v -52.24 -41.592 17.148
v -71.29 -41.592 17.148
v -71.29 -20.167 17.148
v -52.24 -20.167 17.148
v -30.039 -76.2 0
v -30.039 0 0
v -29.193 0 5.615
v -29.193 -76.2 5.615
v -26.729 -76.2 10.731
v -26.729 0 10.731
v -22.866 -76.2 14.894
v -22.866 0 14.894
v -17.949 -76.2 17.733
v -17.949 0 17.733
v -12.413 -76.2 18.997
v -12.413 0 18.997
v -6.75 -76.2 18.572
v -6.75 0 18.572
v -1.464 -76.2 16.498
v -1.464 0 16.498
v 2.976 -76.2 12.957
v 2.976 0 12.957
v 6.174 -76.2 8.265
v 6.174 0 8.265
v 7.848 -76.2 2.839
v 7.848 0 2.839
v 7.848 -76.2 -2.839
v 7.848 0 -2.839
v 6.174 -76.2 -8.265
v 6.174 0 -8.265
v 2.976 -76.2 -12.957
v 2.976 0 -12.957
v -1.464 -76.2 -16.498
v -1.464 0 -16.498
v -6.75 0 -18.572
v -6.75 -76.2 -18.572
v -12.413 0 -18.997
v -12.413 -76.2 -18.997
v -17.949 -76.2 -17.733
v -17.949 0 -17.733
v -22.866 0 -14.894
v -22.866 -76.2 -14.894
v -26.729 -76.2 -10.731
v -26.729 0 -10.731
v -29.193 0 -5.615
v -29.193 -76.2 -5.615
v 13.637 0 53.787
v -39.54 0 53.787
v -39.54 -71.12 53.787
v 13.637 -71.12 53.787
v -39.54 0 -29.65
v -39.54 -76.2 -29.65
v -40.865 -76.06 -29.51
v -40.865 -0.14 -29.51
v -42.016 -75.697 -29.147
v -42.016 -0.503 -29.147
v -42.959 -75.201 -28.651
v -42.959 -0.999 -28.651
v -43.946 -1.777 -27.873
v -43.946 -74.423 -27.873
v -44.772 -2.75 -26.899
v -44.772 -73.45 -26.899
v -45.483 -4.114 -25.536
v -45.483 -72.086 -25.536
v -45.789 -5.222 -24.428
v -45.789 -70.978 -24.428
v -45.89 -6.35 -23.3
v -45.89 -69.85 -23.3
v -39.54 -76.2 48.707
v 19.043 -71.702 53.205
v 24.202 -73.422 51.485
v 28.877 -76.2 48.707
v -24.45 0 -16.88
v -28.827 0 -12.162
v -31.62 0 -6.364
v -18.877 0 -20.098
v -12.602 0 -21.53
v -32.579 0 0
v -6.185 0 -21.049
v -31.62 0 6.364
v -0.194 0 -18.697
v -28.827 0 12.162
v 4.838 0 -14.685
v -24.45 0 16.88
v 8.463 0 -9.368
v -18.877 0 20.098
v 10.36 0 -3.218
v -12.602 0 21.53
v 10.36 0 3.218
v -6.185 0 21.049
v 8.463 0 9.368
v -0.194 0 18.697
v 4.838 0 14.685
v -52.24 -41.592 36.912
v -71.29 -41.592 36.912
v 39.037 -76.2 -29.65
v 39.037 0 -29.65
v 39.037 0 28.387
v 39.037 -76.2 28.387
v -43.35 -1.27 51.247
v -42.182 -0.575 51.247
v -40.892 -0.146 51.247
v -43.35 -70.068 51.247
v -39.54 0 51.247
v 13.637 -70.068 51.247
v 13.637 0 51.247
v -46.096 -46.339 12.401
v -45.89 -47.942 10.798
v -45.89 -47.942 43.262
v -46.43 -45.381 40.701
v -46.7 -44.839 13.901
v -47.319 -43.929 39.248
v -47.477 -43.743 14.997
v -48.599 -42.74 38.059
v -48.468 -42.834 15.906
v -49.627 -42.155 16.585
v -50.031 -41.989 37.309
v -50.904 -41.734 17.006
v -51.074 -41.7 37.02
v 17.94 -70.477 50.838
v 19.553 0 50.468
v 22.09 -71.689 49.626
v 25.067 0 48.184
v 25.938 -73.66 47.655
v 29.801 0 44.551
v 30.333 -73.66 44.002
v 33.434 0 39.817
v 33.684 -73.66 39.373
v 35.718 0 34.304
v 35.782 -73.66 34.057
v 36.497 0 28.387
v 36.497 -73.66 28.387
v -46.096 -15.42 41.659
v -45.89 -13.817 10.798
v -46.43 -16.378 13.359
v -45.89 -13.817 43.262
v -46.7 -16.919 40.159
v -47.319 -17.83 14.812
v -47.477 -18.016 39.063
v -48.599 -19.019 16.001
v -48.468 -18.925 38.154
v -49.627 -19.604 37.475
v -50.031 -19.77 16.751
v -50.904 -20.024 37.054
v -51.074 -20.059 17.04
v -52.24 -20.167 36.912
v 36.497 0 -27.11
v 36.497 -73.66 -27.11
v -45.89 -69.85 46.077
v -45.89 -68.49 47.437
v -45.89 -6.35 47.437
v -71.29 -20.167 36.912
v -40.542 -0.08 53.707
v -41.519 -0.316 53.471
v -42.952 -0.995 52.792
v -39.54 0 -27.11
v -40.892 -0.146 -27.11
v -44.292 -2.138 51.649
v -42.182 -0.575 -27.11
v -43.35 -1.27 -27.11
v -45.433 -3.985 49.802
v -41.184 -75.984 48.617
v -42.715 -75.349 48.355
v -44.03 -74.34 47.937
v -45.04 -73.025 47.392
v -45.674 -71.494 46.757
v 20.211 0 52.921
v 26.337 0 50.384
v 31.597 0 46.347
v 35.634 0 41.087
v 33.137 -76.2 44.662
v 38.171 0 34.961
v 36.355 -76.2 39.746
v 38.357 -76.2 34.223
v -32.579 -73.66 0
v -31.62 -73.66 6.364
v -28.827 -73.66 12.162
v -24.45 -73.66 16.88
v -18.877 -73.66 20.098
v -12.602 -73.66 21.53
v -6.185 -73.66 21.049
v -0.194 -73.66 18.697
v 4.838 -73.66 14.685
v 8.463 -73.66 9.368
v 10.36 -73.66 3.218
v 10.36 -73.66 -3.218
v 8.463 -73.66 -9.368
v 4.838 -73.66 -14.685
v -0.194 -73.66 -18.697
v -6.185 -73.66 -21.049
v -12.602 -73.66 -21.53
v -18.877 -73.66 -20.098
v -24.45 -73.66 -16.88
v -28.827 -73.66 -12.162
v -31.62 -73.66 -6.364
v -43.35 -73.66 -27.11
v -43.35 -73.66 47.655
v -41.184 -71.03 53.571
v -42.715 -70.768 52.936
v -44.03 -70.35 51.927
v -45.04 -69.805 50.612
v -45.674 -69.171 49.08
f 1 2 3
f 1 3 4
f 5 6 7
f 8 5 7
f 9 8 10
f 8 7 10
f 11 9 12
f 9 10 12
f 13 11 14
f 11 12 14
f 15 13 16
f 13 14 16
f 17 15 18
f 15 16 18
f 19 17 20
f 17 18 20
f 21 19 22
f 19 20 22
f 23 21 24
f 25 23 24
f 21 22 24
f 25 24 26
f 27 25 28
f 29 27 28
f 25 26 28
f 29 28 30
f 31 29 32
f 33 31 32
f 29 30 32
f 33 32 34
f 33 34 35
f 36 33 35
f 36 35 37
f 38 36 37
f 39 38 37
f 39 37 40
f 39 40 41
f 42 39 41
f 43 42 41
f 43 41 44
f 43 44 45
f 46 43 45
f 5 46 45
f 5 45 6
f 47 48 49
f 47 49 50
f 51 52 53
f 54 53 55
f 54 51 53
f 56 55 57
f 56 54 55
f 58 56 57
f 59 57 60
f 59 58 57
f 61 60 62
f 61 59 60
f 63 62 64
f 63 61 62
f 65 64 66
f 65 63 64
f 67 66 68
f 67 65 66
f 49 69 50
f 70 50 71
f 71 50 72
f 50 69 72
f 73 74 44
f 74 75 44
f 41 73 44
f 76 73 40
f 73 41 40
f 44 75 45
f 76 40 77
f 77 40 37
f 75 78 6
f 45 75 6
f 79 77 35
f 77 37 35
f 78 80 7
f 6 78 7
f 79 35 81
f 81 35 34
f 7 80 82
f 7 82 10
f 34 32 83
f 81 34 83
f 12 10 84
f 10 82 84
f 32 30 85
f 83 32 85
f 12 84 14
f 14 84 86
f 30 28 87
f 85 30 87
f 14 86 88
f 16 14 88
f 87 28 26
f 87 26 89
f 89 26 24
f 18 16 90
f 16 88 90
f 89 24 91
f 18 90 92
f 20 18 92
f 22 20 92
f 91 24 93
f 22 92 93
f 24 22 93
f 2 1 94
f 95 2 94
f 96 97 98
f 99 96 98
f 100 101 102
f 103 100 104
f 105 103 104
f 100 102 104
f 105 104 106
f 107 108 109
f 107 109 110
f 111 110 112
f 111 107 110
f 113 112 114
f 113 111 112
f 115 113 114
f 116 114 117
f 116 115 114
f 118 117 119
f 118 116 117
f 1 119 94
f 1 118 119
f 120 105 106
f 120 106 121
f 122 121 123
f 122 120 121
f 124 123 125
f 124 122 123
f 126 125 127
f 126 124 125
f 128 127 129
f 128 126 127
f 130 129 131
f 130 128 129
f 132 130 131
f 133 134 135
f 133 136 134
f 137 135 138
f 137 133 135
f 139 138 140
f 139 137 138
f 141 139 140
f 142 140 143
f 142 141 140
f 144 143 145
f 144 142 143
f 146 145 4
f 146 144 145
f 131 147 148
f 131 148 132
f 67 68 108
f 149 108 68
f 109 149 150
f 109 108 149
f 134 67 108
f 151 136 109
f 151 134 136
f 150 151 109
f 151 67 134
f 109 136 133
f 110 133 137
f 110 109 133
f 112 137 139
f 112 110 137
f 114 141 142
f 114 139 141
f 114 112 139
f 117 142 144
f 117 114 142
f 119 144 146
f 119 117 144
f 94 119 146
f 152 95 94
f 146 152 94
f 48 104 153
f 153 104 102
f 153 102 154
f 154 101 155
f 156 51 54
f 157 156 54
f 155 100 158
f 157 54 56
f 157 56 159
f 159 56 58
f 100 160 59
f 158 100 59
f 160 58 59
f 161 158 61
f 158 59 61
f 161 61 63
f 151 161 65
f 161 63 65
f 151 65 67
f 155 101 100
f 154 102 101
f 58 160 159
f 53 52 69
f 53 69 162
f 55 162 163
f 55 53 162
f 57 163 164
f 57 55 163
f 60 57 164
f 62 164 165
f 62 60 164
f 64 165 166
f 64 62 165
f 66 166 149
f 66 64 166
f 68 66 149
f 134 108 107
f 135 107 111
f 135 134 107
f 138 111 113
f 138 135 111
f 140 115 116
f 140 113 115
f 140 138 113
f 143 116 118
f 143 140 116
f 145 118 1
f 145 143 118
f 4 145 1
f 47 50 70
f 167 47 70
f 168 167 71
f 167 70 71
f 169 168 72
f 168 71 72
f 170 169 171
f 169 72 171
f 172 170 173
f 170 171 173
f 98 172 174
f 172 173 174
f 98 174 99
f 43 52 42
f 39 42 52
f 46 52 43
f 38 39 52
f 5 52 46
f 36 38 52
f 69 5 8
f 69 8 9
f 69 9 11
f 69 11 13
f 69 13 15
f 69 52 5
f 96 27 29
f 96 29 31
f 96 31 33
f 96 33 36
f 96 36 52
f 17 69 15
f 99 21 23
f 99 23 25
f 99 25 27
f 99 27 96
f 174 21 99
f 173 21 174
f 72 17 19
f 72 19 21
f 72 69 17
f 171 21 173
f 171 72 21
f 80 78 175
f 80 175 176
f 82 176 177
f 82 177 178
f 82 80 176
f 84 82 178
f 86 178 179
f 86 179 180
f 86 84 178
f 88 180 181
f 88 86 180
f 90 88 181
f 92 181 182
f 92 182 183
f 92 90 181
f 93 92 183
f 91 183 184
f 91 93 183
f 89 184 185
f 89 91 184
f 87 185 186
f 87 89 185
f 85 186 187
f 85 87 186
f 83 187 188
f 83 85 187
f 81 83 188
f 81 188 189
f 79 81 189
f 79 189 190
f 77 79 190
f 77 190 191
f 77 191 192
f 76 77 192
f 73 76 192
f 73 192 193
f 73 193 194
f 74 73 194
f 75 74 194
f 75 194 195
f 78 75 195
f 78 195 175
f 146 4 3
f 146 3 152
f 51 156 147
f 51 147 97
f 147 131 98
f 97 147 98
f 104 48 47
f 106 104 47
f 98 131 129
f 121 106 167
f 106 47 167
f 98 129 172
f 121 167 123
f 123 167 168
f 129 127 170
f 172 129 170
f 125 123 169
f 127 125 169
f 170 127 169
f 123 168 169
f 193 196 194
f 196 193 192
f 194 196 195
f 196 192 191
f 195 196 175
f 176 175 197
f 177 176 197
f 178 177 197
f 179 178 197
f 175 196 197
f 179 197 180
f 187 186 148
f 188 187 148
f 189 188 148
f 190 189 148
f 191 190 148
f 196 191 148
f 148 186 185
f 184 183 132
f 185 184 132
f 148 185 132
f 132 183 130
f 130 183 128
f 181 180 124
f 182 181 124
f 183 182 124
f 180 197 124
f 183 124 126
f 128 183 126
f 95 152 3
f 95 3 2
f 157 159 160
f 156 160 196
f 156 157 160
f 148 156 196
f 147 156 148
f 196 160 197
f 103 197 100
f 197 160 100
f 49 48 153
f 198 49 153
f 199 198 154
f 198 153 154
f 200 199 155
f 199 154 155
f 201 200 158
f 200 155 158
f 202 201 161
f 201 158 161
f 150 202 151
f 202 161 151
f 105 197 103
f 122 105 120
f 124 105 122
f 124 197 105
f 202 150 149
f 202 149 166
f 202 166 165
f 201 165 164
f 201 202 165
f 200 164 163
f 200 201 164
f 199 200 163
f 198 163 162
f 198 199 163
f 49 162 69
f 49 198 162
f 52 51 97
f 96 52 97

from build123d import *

# Parameters (mm, degrees)
F0_W          = 84.9268175662
F0_H          = 83.4368709475
F1_DEPTH      = 76.2
F2_SIZE       = 5.08
F3_R          = 25.4
F5_D          = 38.1
F8_T          = -2.54
F9_W          = 21.4254707098
F9_H          = 19.7638887912
F10_DEPTH     = 25.4
F11_T1_DEPTH  = 19.7638887912
F11_T3_DEPTH  = 21.4254707098
F11_T9_DEPTH  = 35.6388887912
F11_T13_DEPTH = 37.3004707098
F11_T20_DEPTH = 35.6388887912
F11_T24_DEPTH = 37.3004707098
F11_T31_DEPTH = 37.3004707098
F11_T35_DEPTH = 35.6388887912
F11_T42_DEPTH = 35.6388887912
F11_T46_DEPTH = 37.3004707098
F11_T49_DEPTH = 102.87
F11_T51_DEPTH = 38.9342048969
F11_T53_DEPTH = 115.1868709475
F11_T55_DEPTH = 110.1068709475
F11_T57_DEPTH = 107.95


# Not quite as in the source:
# - a fillet or chamfer that OpenCascade refuses, or shapes differently, is made with other operations: its cross-section is extruded or revolved along the edge and cut away or added


with BuildPart() as f1:
    # F0 (on Front) → F1 (new body)
    with BuildSketch(Plane.XZ):
        with Locations((-3.4268703312, 12.0685463771)):
            Rectangle(F0_W, F0_H)
    extrude(amount=F1_DEPTH)

    # F2
    f2_edges = [f1.edges().sort_by_distance(p)[0] for p in [
        (-3.42687, -76.2, 53.786982),
    ]]
    chamfer(f2_edges, length=F2_SIZE)

    # F3
    f3_edges = [f1.edges().sort_by_distance(p)[0] for p in [
        (39.036538, -35.56, 53.786982),
    ]]
    fillet(f3_edges, radius=F3_R)

    # F5 (through all)
    with Locations(Plane.XZ.offset(76.2)):
        with Locations((-10.9889917076, 0)):
            Hole(F5_D / 2)

    # F8
    f8_openings = [f1.faces().sort_by_distance(p)[0] for p in [
        (-16.12687, 0, 52.596424),
    ]]
    offset(amount=F8_T, openings=f8_openings)

    # F9 (on face) → F10 (join)
    with BuildSketch(Plane(origin=(-45.8902791142, 0, 0), x_dir=(0, -1, 0), z_dir=(-1, 0, 0))):
        with Locations((30.8794565499, 27.0300125703)):
            Rectangle(F9_W, F9_H)
    extrude(amount=F10_DEPTH)

    # F11: fillet of radius 6.35 on 9 edges, made by hand

    # F11_s2 → F11_t1 (join)
    with BuildSketch(Plane.XY.offset(17.1480681747)):
        with BuildLine():
            ThreePointArc((-45.8902791142, -13.816721195), (-47.7501510537, -18.3068492555), (-52.2402791142, -20.166721195))
            Line((-52.2402791142, -20.166721195), (-45.8902791142, -20.166721195))
            Line((-45.8902791142, -20.166721195), (-45.8902791142, -13.816721195))
        make_face()
        with BuildLine():
            ThreePointArc((-45.8902791142, -47.9421919048), (-47.7501510537, -43.4520638442), (-52.2402791142, -41.5921919048))
            Line((-52.2402791142, -41.5921919048), (-45.8902791142, -41.5921919048))
            Line((-45.8902791142, -41.5921919048), (-45.8902791142, -47.9421919048))
        make_face()
    extrude(amount=F11_T1_DEPTH)

    # F11_s4 → F11_t3 (join)
    with BuildSketch(Plane.XZ.offset(20.166721195)):
        with BuildLine():
            ThreePointArc((-45.8902791142, 43.2619569659), (-47.7501510537, 38.7718289054), (-52.2402791142, 36.9119569659))
            Line((-52.2402791142, 36.9119569659), (-45.8902791142, 36.9119569659))
            Line((-45.8902791142, 36.9119569659), (-45.8902791142, 43.2619569659))
        make_face()
        with BuildLine():
            ThreePointArc((-45.8902791142, 10.7980681747), (-47.7501510537, 15.2881962353), (-52.2402791142, 17.1480681747))
            Line((-52.2402791142, 17.1480681747), (-45.8902791142, 17.1480681747))
            Line((-45.8902791142, 17.1480681747), (-45.8902791142, 10.7980681747))
        make_face()
    extrude(amount=F11_T3_DEPTH)


with BuildPart() as f11_tool7:
    # F11_s8 → F11_t9 (new body)
    with BuildSketch(Plane.XY.offset(52.7869569659)):
        with BuildLine():
            ThreePointArc((-45.8902791142, -13.816721195), (-47.7501510537, -18.3068492555), (-52.2402791142, -20.166721195))
            Line((-52.2402791142, -20.166721195), (-45.8902791142, -20.166721195))
            Line((-45.8902791142, -20.166721195), (-45.8902791142, -13.816721195))
        make_face()
    extrude(amount=-F11_T9_DEPTH)

    split(bisect_by=Plane.XY.offset(36.9119569659), keep=Keep.TOP)


with BuildPart() as f11_tool11:
    # F11_s12 → F11_t13 (new body)
    with BuildSketch(Plane.XZ.offset(41.5921919048)):
        with BuildLine():
            ThreePointArc((-45.8902791142, 43.2619569659), (-47.7501510537, 38.7718289054), (-52.2402791142, 36.9119569659))
            Line((-52.2402791142, 36.9119569659), (-45.8902791142, 36.9119569659))
            Line((-45.8902791142, 36.9119569659), (-45.8902791142, 43.2619569659))
        make_face()
    extrude(amount=-F11_T13_DEPTH)

    split(bisect_by=Plane.XZ.offset(20.166721195), keep=Keep.BOTTOM)


with BuildPart() as f11_tool7_1:
    add(f11_tool7.part)

    # F11_t15: intersect F11_tool11
    add(f11_tool11.part, mode=Mode.INTERSECT)


with BuildPart() as f1_1:
    add(f1.part)

    # F11_t5: union F11_tool7
    add(f11_tool7_1.part)


with BuildPart() as f11_tool18:
    # F11_s19 → F11_t20 (new body)
    with BuildSketch(Plane.XY.offset(36.9119569659)):
        with BuildLine():
            ThreePointArc((-45.8902791142, -13.816721195), (-47.7501510537, -18.3068492555), (-52.2402791142, -20.166721195))
            Line((-52.2402791142, -20.166721195), (-45.8902791142, -20.166721195))
            Line((-45.8902791142, -20.166721195), (-45.8902791142, -13.816721195))
        make_face()
    extrude(amount=-F11_T20_DEPTH)

    split(bisect_by=Plane.XY.offset(17.1480681747), keep=Keep.BOTTOM)


with BuildPart() as f11_tool22:
    # F11_s23 → F11_t24 (new body)
    with BuildSketch(Plane.XZ.offset(4.291721195)):
        with BuildLine():
            ThreePointArc((-45.8902791142, 10.7980681747), (-47.7501510537, 15.2881962353), (-52.2402791142, 17.1480681747))
            Line((-52.2402791142, 17.1480681747), (-45.8902791142, 17.1480681747))
            Line((-45.8902791142, 17.1480681747), (-45.8902791142, 10.7980681747))
        make_face()
    extrude(amount=F11_T24_DEPTH)

    split(bisect_by=Plane.XZ.offset(20.166721195), keep=Keep.BOTTOM)


with BuildPart() as f11_tool18_1:
    add(f11_tool18.part)

    # F11_t26: intersect F11_tool22
    add(f11_tool22.part, mode=Mode.INTERSECT)


with BuildPart() as f1_2:
    add(f1_1.part)

    # F11_t16: union F11_tool18
    add(f11_tool18_1.part)


with BuildPart() as f11_tool29:
    # F11_s30 → F11_t31 (new body)
    with BuildSketch(Plane.XZ.offset(57.4671919048)):
        with BuildLine():
            ThreePointArc((-45.8902791142, 43.2619569659), (-47.7501510537, 38.7718289054), (-52.2402791142, 36.9119569659))
            Line((-52.2402791142, 36.9119569659), (-45.8902791142, 36.9119569659))
            Line((-45.8902791142, 36.9119569659), (-45.8902791142, 43.2619569659))
        make_face()
    extrude(amount=-F11_T31_DEPTH)

    split(bisect_by=Plane.XZ.offset(41.5921919048), keep=Keep.TOP)


with BuildPart() as f11_tool33:
    # F11_s34 → F11_t35 (new body)
    with BuildSketch(Plane.XY.offset(17.1480681747)):
        with BuildLine():
            ThreePointArc((-45.8902791142, -47.9421919048), (-47.7501510537, -43.4520638442), (-52.2402791142, -41.5921919048))
            Line((-52.2402791142, -41.5921919048), (-45.8902791142, -41.5921919048))
            Line((-45.8902791142, -41.5921919048), (-45.8902791142, -47.9421919048))
        make_face()
    extrude(amount=F11_T35_DEPTH)

    split(bisect_by=Plane.XY.offset(36.9119569659), keep=Keep.TOP)


with BuildPart() as f11_tool29_1:
    add(f11_tool29.part)

    # F11_t37: intersect F11_tool33
    add(f11_tool33.part, mode=Mode.INTERSECT)


with BuildPart() as f1_3:
    add(f1_2.part)

    # F11_t27: union F11_tool29
    add(f11_tool29_1.part)


with BuildPart() as f11_tool40:
    # F11_s41 → F11_t42 (new body)
    with BuildSketch(Plane.XY.offset(1.2730681747)):
        with BuildLine():
            ThreePointArc((-45.8902791142, -47.9421919048), (-47.7501510537, -43.4520638442), (-52.2402791142, -41.5921919048))
            Line((-52.2402791142, -41.5921919048), (-45.8902791142, -41.5921919048))
            Line((-45.8902791142, -41.5921919048), (-45.8902791142, -47.9421919048))
        make_face()
    extrude(amount=F11_T42_DEPTH)

    split(bisect_by=Plane.XY.offset(17.1480681747), keep=Keep.BOTTOM)


with BuildPart() as f11_tool44:
    # F11_s45 → F11_t46 (new body)
    with BuildSketch(Plane.XZ.offset(20.166721195)):
        with BuildLine():
            ThreePointArc((-45.8902791142, 10.7980681747), (-47.7501510537, 15.2881962353), (-52.2402791142, 17.1480681747))
            Line((-52.2402791142, 17.1480681747), (-45.8902791142, 17.1480681747))
            Line((-45.8902791142, 17.1480681747), (-45.8902791142, 10.7980681747))
        make_face()
    extrude(amount=F11_T46_DEPTH)

    split(bisect_by=Plane.XZ.offset(41.5921919048), keep=Keep.TOP)


with BuildPart() as f11_tool40_1:
    add(f11_tool40.part)

    # F11_t48: intersect F11_tool44
    add(f11_tool44.part, mode=Mode.INTERSECT)


with BuildPart() as f1_4:
    add(f1_3.part)

    # F11_t38: union F11_tool40
    add(f11_tool40_1.part)

    # F11_s50 → F11_t49 (cut)
    with BuildSketch(Plane.XZ.offset(-15.875)):
        with BuildLine():
            ThreePointArc((-39.5402791142, 53.7869818509), (-44.0304071748, 51.9271099114), (-45.8902791142, 47.4369818509))
            Line((-45.8902791142, 47.4369818509), (-45.8902791142, 53.7869818509))
            Line((-45.8902791142, 53.7869818509), (-39.5402791142, 53.7869818509))
        make_face()
    extrude(amount=F11_T49_DEPTH, mode=Mode.SUBTRACT)

    # F11_s52 → F11_t51 (cut)
    with BuildSketch(Plane(origin=(0, 2.5588110768, 2.5588110768), x_dir=(1, 0, 0), z_dir=(0, -0.7071067812, -0.7071067812))):
        with BuildLine():
            ThreePointArc((-45.8902791142, 81.9725738843), (-44.0304071748, 86.4627019448), (-39.5402791142, 88.3225738843))
            Line((-39.5402791142, 88.3225738843), (-45.8902791142, 88.3225738843))
            Line((-45.8902791142, 88.3225738843), (-45.8902791142, 81.9725738843))
        make_face()
    extrude(amount=F11_T51_DEPTH, mode=Mode.SUBTRACT)

    # F11_s54 → F11_t53 (cut)
    with BuildSketch(Plane.XY.offset(-45.5248890966)):
        with BuildLine():
            ThreePointArc((-39.5402791142, 0), (-44.0304071748, -1.8598719395), (-45.8902791142, -6.35))
            Line((-45.8902791142, -6.35), (-45.8902791142, 0))
            Line((-45.8902791142, 0), (-39.5402791142, 0))
        make_face()
    extrude(amount=F11_T53_DEPTH, mode=Mode.SUBTRACT)

    # F11_s56 → F11_t55 (cut)
    with BuildSketch(Plane.XY.offset(-45.5248890966)):
        with BuildLine():
            ThreePointArc((-39.5402791142, -76.2), (-44.0304071748, -74.3401280605), (-45.8902791142, -69.85))
            Line((-45.8902791142, -69.85), (-45.8902791142, -76.2))
            Line((-45.8902791142, -76.2), (-39.5402791142, -76.2))
        make_face()
    extrude(amount=F11_T55_DEPTH, mode=Mode.SUBTRACT)

    # F11_s58 → F11_t57 (cut)
    with BuildSketch(Plane.XZ.offset(-15.875)):
        with BuildLine():
            ThreePointArc((-39.5402791142, -29.6498890966), (-44.0304071748, -27.7900171572), (-45.8902791142, -23.2998890966))
            Line((-45.8902791142, -23.2998890966), (-45.8902791142, -29.6498890966))
            Line((-45.8902791142, -29.6498890966), (-39.5402791142, -29.6498890966))
        make_face()
    extrude(amount=F11_T57_DEPTH, mode=Mode.SUBTRACT)


solid = f1_4.part
